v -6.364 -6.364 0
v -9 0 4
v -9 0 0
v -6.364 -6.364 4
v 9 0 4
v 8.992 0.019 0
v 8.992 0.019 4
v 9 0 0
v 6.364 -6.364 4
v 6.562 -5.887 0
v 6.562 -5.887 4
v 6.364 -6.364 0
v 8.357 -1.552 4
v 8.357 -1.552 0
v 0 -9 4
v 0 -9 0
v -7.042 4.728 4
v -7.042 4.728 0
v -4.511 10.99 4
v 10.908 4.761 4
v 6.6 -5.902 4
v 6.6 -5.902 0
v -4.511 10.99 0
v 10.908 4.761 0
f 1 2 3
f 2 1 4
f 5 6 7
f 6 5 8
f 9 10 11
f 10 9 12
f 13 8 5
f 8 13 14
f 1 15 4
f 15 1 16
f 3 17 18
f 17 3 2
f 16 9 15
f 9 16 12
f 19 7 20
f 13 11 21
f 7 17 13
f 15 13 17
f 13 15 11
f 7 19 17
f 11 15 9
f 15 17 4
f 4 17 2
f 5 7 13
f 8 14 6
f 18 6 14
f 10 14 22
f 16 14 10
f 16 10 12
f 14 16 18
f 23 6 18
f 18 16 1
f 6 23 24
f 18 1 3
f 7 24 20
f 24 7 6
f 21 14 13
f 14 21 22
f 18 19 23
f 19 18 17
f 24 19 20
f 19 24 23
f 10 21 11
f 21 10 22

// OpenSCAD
//Question 6
color("#67B7D1"){
    cylinder(r=9, h=4, $fn=8);
    rotate([0, 0, -22])
        translate([-8.3, -3, 0])
        cube([16.63, 11.5, 4]);
}
